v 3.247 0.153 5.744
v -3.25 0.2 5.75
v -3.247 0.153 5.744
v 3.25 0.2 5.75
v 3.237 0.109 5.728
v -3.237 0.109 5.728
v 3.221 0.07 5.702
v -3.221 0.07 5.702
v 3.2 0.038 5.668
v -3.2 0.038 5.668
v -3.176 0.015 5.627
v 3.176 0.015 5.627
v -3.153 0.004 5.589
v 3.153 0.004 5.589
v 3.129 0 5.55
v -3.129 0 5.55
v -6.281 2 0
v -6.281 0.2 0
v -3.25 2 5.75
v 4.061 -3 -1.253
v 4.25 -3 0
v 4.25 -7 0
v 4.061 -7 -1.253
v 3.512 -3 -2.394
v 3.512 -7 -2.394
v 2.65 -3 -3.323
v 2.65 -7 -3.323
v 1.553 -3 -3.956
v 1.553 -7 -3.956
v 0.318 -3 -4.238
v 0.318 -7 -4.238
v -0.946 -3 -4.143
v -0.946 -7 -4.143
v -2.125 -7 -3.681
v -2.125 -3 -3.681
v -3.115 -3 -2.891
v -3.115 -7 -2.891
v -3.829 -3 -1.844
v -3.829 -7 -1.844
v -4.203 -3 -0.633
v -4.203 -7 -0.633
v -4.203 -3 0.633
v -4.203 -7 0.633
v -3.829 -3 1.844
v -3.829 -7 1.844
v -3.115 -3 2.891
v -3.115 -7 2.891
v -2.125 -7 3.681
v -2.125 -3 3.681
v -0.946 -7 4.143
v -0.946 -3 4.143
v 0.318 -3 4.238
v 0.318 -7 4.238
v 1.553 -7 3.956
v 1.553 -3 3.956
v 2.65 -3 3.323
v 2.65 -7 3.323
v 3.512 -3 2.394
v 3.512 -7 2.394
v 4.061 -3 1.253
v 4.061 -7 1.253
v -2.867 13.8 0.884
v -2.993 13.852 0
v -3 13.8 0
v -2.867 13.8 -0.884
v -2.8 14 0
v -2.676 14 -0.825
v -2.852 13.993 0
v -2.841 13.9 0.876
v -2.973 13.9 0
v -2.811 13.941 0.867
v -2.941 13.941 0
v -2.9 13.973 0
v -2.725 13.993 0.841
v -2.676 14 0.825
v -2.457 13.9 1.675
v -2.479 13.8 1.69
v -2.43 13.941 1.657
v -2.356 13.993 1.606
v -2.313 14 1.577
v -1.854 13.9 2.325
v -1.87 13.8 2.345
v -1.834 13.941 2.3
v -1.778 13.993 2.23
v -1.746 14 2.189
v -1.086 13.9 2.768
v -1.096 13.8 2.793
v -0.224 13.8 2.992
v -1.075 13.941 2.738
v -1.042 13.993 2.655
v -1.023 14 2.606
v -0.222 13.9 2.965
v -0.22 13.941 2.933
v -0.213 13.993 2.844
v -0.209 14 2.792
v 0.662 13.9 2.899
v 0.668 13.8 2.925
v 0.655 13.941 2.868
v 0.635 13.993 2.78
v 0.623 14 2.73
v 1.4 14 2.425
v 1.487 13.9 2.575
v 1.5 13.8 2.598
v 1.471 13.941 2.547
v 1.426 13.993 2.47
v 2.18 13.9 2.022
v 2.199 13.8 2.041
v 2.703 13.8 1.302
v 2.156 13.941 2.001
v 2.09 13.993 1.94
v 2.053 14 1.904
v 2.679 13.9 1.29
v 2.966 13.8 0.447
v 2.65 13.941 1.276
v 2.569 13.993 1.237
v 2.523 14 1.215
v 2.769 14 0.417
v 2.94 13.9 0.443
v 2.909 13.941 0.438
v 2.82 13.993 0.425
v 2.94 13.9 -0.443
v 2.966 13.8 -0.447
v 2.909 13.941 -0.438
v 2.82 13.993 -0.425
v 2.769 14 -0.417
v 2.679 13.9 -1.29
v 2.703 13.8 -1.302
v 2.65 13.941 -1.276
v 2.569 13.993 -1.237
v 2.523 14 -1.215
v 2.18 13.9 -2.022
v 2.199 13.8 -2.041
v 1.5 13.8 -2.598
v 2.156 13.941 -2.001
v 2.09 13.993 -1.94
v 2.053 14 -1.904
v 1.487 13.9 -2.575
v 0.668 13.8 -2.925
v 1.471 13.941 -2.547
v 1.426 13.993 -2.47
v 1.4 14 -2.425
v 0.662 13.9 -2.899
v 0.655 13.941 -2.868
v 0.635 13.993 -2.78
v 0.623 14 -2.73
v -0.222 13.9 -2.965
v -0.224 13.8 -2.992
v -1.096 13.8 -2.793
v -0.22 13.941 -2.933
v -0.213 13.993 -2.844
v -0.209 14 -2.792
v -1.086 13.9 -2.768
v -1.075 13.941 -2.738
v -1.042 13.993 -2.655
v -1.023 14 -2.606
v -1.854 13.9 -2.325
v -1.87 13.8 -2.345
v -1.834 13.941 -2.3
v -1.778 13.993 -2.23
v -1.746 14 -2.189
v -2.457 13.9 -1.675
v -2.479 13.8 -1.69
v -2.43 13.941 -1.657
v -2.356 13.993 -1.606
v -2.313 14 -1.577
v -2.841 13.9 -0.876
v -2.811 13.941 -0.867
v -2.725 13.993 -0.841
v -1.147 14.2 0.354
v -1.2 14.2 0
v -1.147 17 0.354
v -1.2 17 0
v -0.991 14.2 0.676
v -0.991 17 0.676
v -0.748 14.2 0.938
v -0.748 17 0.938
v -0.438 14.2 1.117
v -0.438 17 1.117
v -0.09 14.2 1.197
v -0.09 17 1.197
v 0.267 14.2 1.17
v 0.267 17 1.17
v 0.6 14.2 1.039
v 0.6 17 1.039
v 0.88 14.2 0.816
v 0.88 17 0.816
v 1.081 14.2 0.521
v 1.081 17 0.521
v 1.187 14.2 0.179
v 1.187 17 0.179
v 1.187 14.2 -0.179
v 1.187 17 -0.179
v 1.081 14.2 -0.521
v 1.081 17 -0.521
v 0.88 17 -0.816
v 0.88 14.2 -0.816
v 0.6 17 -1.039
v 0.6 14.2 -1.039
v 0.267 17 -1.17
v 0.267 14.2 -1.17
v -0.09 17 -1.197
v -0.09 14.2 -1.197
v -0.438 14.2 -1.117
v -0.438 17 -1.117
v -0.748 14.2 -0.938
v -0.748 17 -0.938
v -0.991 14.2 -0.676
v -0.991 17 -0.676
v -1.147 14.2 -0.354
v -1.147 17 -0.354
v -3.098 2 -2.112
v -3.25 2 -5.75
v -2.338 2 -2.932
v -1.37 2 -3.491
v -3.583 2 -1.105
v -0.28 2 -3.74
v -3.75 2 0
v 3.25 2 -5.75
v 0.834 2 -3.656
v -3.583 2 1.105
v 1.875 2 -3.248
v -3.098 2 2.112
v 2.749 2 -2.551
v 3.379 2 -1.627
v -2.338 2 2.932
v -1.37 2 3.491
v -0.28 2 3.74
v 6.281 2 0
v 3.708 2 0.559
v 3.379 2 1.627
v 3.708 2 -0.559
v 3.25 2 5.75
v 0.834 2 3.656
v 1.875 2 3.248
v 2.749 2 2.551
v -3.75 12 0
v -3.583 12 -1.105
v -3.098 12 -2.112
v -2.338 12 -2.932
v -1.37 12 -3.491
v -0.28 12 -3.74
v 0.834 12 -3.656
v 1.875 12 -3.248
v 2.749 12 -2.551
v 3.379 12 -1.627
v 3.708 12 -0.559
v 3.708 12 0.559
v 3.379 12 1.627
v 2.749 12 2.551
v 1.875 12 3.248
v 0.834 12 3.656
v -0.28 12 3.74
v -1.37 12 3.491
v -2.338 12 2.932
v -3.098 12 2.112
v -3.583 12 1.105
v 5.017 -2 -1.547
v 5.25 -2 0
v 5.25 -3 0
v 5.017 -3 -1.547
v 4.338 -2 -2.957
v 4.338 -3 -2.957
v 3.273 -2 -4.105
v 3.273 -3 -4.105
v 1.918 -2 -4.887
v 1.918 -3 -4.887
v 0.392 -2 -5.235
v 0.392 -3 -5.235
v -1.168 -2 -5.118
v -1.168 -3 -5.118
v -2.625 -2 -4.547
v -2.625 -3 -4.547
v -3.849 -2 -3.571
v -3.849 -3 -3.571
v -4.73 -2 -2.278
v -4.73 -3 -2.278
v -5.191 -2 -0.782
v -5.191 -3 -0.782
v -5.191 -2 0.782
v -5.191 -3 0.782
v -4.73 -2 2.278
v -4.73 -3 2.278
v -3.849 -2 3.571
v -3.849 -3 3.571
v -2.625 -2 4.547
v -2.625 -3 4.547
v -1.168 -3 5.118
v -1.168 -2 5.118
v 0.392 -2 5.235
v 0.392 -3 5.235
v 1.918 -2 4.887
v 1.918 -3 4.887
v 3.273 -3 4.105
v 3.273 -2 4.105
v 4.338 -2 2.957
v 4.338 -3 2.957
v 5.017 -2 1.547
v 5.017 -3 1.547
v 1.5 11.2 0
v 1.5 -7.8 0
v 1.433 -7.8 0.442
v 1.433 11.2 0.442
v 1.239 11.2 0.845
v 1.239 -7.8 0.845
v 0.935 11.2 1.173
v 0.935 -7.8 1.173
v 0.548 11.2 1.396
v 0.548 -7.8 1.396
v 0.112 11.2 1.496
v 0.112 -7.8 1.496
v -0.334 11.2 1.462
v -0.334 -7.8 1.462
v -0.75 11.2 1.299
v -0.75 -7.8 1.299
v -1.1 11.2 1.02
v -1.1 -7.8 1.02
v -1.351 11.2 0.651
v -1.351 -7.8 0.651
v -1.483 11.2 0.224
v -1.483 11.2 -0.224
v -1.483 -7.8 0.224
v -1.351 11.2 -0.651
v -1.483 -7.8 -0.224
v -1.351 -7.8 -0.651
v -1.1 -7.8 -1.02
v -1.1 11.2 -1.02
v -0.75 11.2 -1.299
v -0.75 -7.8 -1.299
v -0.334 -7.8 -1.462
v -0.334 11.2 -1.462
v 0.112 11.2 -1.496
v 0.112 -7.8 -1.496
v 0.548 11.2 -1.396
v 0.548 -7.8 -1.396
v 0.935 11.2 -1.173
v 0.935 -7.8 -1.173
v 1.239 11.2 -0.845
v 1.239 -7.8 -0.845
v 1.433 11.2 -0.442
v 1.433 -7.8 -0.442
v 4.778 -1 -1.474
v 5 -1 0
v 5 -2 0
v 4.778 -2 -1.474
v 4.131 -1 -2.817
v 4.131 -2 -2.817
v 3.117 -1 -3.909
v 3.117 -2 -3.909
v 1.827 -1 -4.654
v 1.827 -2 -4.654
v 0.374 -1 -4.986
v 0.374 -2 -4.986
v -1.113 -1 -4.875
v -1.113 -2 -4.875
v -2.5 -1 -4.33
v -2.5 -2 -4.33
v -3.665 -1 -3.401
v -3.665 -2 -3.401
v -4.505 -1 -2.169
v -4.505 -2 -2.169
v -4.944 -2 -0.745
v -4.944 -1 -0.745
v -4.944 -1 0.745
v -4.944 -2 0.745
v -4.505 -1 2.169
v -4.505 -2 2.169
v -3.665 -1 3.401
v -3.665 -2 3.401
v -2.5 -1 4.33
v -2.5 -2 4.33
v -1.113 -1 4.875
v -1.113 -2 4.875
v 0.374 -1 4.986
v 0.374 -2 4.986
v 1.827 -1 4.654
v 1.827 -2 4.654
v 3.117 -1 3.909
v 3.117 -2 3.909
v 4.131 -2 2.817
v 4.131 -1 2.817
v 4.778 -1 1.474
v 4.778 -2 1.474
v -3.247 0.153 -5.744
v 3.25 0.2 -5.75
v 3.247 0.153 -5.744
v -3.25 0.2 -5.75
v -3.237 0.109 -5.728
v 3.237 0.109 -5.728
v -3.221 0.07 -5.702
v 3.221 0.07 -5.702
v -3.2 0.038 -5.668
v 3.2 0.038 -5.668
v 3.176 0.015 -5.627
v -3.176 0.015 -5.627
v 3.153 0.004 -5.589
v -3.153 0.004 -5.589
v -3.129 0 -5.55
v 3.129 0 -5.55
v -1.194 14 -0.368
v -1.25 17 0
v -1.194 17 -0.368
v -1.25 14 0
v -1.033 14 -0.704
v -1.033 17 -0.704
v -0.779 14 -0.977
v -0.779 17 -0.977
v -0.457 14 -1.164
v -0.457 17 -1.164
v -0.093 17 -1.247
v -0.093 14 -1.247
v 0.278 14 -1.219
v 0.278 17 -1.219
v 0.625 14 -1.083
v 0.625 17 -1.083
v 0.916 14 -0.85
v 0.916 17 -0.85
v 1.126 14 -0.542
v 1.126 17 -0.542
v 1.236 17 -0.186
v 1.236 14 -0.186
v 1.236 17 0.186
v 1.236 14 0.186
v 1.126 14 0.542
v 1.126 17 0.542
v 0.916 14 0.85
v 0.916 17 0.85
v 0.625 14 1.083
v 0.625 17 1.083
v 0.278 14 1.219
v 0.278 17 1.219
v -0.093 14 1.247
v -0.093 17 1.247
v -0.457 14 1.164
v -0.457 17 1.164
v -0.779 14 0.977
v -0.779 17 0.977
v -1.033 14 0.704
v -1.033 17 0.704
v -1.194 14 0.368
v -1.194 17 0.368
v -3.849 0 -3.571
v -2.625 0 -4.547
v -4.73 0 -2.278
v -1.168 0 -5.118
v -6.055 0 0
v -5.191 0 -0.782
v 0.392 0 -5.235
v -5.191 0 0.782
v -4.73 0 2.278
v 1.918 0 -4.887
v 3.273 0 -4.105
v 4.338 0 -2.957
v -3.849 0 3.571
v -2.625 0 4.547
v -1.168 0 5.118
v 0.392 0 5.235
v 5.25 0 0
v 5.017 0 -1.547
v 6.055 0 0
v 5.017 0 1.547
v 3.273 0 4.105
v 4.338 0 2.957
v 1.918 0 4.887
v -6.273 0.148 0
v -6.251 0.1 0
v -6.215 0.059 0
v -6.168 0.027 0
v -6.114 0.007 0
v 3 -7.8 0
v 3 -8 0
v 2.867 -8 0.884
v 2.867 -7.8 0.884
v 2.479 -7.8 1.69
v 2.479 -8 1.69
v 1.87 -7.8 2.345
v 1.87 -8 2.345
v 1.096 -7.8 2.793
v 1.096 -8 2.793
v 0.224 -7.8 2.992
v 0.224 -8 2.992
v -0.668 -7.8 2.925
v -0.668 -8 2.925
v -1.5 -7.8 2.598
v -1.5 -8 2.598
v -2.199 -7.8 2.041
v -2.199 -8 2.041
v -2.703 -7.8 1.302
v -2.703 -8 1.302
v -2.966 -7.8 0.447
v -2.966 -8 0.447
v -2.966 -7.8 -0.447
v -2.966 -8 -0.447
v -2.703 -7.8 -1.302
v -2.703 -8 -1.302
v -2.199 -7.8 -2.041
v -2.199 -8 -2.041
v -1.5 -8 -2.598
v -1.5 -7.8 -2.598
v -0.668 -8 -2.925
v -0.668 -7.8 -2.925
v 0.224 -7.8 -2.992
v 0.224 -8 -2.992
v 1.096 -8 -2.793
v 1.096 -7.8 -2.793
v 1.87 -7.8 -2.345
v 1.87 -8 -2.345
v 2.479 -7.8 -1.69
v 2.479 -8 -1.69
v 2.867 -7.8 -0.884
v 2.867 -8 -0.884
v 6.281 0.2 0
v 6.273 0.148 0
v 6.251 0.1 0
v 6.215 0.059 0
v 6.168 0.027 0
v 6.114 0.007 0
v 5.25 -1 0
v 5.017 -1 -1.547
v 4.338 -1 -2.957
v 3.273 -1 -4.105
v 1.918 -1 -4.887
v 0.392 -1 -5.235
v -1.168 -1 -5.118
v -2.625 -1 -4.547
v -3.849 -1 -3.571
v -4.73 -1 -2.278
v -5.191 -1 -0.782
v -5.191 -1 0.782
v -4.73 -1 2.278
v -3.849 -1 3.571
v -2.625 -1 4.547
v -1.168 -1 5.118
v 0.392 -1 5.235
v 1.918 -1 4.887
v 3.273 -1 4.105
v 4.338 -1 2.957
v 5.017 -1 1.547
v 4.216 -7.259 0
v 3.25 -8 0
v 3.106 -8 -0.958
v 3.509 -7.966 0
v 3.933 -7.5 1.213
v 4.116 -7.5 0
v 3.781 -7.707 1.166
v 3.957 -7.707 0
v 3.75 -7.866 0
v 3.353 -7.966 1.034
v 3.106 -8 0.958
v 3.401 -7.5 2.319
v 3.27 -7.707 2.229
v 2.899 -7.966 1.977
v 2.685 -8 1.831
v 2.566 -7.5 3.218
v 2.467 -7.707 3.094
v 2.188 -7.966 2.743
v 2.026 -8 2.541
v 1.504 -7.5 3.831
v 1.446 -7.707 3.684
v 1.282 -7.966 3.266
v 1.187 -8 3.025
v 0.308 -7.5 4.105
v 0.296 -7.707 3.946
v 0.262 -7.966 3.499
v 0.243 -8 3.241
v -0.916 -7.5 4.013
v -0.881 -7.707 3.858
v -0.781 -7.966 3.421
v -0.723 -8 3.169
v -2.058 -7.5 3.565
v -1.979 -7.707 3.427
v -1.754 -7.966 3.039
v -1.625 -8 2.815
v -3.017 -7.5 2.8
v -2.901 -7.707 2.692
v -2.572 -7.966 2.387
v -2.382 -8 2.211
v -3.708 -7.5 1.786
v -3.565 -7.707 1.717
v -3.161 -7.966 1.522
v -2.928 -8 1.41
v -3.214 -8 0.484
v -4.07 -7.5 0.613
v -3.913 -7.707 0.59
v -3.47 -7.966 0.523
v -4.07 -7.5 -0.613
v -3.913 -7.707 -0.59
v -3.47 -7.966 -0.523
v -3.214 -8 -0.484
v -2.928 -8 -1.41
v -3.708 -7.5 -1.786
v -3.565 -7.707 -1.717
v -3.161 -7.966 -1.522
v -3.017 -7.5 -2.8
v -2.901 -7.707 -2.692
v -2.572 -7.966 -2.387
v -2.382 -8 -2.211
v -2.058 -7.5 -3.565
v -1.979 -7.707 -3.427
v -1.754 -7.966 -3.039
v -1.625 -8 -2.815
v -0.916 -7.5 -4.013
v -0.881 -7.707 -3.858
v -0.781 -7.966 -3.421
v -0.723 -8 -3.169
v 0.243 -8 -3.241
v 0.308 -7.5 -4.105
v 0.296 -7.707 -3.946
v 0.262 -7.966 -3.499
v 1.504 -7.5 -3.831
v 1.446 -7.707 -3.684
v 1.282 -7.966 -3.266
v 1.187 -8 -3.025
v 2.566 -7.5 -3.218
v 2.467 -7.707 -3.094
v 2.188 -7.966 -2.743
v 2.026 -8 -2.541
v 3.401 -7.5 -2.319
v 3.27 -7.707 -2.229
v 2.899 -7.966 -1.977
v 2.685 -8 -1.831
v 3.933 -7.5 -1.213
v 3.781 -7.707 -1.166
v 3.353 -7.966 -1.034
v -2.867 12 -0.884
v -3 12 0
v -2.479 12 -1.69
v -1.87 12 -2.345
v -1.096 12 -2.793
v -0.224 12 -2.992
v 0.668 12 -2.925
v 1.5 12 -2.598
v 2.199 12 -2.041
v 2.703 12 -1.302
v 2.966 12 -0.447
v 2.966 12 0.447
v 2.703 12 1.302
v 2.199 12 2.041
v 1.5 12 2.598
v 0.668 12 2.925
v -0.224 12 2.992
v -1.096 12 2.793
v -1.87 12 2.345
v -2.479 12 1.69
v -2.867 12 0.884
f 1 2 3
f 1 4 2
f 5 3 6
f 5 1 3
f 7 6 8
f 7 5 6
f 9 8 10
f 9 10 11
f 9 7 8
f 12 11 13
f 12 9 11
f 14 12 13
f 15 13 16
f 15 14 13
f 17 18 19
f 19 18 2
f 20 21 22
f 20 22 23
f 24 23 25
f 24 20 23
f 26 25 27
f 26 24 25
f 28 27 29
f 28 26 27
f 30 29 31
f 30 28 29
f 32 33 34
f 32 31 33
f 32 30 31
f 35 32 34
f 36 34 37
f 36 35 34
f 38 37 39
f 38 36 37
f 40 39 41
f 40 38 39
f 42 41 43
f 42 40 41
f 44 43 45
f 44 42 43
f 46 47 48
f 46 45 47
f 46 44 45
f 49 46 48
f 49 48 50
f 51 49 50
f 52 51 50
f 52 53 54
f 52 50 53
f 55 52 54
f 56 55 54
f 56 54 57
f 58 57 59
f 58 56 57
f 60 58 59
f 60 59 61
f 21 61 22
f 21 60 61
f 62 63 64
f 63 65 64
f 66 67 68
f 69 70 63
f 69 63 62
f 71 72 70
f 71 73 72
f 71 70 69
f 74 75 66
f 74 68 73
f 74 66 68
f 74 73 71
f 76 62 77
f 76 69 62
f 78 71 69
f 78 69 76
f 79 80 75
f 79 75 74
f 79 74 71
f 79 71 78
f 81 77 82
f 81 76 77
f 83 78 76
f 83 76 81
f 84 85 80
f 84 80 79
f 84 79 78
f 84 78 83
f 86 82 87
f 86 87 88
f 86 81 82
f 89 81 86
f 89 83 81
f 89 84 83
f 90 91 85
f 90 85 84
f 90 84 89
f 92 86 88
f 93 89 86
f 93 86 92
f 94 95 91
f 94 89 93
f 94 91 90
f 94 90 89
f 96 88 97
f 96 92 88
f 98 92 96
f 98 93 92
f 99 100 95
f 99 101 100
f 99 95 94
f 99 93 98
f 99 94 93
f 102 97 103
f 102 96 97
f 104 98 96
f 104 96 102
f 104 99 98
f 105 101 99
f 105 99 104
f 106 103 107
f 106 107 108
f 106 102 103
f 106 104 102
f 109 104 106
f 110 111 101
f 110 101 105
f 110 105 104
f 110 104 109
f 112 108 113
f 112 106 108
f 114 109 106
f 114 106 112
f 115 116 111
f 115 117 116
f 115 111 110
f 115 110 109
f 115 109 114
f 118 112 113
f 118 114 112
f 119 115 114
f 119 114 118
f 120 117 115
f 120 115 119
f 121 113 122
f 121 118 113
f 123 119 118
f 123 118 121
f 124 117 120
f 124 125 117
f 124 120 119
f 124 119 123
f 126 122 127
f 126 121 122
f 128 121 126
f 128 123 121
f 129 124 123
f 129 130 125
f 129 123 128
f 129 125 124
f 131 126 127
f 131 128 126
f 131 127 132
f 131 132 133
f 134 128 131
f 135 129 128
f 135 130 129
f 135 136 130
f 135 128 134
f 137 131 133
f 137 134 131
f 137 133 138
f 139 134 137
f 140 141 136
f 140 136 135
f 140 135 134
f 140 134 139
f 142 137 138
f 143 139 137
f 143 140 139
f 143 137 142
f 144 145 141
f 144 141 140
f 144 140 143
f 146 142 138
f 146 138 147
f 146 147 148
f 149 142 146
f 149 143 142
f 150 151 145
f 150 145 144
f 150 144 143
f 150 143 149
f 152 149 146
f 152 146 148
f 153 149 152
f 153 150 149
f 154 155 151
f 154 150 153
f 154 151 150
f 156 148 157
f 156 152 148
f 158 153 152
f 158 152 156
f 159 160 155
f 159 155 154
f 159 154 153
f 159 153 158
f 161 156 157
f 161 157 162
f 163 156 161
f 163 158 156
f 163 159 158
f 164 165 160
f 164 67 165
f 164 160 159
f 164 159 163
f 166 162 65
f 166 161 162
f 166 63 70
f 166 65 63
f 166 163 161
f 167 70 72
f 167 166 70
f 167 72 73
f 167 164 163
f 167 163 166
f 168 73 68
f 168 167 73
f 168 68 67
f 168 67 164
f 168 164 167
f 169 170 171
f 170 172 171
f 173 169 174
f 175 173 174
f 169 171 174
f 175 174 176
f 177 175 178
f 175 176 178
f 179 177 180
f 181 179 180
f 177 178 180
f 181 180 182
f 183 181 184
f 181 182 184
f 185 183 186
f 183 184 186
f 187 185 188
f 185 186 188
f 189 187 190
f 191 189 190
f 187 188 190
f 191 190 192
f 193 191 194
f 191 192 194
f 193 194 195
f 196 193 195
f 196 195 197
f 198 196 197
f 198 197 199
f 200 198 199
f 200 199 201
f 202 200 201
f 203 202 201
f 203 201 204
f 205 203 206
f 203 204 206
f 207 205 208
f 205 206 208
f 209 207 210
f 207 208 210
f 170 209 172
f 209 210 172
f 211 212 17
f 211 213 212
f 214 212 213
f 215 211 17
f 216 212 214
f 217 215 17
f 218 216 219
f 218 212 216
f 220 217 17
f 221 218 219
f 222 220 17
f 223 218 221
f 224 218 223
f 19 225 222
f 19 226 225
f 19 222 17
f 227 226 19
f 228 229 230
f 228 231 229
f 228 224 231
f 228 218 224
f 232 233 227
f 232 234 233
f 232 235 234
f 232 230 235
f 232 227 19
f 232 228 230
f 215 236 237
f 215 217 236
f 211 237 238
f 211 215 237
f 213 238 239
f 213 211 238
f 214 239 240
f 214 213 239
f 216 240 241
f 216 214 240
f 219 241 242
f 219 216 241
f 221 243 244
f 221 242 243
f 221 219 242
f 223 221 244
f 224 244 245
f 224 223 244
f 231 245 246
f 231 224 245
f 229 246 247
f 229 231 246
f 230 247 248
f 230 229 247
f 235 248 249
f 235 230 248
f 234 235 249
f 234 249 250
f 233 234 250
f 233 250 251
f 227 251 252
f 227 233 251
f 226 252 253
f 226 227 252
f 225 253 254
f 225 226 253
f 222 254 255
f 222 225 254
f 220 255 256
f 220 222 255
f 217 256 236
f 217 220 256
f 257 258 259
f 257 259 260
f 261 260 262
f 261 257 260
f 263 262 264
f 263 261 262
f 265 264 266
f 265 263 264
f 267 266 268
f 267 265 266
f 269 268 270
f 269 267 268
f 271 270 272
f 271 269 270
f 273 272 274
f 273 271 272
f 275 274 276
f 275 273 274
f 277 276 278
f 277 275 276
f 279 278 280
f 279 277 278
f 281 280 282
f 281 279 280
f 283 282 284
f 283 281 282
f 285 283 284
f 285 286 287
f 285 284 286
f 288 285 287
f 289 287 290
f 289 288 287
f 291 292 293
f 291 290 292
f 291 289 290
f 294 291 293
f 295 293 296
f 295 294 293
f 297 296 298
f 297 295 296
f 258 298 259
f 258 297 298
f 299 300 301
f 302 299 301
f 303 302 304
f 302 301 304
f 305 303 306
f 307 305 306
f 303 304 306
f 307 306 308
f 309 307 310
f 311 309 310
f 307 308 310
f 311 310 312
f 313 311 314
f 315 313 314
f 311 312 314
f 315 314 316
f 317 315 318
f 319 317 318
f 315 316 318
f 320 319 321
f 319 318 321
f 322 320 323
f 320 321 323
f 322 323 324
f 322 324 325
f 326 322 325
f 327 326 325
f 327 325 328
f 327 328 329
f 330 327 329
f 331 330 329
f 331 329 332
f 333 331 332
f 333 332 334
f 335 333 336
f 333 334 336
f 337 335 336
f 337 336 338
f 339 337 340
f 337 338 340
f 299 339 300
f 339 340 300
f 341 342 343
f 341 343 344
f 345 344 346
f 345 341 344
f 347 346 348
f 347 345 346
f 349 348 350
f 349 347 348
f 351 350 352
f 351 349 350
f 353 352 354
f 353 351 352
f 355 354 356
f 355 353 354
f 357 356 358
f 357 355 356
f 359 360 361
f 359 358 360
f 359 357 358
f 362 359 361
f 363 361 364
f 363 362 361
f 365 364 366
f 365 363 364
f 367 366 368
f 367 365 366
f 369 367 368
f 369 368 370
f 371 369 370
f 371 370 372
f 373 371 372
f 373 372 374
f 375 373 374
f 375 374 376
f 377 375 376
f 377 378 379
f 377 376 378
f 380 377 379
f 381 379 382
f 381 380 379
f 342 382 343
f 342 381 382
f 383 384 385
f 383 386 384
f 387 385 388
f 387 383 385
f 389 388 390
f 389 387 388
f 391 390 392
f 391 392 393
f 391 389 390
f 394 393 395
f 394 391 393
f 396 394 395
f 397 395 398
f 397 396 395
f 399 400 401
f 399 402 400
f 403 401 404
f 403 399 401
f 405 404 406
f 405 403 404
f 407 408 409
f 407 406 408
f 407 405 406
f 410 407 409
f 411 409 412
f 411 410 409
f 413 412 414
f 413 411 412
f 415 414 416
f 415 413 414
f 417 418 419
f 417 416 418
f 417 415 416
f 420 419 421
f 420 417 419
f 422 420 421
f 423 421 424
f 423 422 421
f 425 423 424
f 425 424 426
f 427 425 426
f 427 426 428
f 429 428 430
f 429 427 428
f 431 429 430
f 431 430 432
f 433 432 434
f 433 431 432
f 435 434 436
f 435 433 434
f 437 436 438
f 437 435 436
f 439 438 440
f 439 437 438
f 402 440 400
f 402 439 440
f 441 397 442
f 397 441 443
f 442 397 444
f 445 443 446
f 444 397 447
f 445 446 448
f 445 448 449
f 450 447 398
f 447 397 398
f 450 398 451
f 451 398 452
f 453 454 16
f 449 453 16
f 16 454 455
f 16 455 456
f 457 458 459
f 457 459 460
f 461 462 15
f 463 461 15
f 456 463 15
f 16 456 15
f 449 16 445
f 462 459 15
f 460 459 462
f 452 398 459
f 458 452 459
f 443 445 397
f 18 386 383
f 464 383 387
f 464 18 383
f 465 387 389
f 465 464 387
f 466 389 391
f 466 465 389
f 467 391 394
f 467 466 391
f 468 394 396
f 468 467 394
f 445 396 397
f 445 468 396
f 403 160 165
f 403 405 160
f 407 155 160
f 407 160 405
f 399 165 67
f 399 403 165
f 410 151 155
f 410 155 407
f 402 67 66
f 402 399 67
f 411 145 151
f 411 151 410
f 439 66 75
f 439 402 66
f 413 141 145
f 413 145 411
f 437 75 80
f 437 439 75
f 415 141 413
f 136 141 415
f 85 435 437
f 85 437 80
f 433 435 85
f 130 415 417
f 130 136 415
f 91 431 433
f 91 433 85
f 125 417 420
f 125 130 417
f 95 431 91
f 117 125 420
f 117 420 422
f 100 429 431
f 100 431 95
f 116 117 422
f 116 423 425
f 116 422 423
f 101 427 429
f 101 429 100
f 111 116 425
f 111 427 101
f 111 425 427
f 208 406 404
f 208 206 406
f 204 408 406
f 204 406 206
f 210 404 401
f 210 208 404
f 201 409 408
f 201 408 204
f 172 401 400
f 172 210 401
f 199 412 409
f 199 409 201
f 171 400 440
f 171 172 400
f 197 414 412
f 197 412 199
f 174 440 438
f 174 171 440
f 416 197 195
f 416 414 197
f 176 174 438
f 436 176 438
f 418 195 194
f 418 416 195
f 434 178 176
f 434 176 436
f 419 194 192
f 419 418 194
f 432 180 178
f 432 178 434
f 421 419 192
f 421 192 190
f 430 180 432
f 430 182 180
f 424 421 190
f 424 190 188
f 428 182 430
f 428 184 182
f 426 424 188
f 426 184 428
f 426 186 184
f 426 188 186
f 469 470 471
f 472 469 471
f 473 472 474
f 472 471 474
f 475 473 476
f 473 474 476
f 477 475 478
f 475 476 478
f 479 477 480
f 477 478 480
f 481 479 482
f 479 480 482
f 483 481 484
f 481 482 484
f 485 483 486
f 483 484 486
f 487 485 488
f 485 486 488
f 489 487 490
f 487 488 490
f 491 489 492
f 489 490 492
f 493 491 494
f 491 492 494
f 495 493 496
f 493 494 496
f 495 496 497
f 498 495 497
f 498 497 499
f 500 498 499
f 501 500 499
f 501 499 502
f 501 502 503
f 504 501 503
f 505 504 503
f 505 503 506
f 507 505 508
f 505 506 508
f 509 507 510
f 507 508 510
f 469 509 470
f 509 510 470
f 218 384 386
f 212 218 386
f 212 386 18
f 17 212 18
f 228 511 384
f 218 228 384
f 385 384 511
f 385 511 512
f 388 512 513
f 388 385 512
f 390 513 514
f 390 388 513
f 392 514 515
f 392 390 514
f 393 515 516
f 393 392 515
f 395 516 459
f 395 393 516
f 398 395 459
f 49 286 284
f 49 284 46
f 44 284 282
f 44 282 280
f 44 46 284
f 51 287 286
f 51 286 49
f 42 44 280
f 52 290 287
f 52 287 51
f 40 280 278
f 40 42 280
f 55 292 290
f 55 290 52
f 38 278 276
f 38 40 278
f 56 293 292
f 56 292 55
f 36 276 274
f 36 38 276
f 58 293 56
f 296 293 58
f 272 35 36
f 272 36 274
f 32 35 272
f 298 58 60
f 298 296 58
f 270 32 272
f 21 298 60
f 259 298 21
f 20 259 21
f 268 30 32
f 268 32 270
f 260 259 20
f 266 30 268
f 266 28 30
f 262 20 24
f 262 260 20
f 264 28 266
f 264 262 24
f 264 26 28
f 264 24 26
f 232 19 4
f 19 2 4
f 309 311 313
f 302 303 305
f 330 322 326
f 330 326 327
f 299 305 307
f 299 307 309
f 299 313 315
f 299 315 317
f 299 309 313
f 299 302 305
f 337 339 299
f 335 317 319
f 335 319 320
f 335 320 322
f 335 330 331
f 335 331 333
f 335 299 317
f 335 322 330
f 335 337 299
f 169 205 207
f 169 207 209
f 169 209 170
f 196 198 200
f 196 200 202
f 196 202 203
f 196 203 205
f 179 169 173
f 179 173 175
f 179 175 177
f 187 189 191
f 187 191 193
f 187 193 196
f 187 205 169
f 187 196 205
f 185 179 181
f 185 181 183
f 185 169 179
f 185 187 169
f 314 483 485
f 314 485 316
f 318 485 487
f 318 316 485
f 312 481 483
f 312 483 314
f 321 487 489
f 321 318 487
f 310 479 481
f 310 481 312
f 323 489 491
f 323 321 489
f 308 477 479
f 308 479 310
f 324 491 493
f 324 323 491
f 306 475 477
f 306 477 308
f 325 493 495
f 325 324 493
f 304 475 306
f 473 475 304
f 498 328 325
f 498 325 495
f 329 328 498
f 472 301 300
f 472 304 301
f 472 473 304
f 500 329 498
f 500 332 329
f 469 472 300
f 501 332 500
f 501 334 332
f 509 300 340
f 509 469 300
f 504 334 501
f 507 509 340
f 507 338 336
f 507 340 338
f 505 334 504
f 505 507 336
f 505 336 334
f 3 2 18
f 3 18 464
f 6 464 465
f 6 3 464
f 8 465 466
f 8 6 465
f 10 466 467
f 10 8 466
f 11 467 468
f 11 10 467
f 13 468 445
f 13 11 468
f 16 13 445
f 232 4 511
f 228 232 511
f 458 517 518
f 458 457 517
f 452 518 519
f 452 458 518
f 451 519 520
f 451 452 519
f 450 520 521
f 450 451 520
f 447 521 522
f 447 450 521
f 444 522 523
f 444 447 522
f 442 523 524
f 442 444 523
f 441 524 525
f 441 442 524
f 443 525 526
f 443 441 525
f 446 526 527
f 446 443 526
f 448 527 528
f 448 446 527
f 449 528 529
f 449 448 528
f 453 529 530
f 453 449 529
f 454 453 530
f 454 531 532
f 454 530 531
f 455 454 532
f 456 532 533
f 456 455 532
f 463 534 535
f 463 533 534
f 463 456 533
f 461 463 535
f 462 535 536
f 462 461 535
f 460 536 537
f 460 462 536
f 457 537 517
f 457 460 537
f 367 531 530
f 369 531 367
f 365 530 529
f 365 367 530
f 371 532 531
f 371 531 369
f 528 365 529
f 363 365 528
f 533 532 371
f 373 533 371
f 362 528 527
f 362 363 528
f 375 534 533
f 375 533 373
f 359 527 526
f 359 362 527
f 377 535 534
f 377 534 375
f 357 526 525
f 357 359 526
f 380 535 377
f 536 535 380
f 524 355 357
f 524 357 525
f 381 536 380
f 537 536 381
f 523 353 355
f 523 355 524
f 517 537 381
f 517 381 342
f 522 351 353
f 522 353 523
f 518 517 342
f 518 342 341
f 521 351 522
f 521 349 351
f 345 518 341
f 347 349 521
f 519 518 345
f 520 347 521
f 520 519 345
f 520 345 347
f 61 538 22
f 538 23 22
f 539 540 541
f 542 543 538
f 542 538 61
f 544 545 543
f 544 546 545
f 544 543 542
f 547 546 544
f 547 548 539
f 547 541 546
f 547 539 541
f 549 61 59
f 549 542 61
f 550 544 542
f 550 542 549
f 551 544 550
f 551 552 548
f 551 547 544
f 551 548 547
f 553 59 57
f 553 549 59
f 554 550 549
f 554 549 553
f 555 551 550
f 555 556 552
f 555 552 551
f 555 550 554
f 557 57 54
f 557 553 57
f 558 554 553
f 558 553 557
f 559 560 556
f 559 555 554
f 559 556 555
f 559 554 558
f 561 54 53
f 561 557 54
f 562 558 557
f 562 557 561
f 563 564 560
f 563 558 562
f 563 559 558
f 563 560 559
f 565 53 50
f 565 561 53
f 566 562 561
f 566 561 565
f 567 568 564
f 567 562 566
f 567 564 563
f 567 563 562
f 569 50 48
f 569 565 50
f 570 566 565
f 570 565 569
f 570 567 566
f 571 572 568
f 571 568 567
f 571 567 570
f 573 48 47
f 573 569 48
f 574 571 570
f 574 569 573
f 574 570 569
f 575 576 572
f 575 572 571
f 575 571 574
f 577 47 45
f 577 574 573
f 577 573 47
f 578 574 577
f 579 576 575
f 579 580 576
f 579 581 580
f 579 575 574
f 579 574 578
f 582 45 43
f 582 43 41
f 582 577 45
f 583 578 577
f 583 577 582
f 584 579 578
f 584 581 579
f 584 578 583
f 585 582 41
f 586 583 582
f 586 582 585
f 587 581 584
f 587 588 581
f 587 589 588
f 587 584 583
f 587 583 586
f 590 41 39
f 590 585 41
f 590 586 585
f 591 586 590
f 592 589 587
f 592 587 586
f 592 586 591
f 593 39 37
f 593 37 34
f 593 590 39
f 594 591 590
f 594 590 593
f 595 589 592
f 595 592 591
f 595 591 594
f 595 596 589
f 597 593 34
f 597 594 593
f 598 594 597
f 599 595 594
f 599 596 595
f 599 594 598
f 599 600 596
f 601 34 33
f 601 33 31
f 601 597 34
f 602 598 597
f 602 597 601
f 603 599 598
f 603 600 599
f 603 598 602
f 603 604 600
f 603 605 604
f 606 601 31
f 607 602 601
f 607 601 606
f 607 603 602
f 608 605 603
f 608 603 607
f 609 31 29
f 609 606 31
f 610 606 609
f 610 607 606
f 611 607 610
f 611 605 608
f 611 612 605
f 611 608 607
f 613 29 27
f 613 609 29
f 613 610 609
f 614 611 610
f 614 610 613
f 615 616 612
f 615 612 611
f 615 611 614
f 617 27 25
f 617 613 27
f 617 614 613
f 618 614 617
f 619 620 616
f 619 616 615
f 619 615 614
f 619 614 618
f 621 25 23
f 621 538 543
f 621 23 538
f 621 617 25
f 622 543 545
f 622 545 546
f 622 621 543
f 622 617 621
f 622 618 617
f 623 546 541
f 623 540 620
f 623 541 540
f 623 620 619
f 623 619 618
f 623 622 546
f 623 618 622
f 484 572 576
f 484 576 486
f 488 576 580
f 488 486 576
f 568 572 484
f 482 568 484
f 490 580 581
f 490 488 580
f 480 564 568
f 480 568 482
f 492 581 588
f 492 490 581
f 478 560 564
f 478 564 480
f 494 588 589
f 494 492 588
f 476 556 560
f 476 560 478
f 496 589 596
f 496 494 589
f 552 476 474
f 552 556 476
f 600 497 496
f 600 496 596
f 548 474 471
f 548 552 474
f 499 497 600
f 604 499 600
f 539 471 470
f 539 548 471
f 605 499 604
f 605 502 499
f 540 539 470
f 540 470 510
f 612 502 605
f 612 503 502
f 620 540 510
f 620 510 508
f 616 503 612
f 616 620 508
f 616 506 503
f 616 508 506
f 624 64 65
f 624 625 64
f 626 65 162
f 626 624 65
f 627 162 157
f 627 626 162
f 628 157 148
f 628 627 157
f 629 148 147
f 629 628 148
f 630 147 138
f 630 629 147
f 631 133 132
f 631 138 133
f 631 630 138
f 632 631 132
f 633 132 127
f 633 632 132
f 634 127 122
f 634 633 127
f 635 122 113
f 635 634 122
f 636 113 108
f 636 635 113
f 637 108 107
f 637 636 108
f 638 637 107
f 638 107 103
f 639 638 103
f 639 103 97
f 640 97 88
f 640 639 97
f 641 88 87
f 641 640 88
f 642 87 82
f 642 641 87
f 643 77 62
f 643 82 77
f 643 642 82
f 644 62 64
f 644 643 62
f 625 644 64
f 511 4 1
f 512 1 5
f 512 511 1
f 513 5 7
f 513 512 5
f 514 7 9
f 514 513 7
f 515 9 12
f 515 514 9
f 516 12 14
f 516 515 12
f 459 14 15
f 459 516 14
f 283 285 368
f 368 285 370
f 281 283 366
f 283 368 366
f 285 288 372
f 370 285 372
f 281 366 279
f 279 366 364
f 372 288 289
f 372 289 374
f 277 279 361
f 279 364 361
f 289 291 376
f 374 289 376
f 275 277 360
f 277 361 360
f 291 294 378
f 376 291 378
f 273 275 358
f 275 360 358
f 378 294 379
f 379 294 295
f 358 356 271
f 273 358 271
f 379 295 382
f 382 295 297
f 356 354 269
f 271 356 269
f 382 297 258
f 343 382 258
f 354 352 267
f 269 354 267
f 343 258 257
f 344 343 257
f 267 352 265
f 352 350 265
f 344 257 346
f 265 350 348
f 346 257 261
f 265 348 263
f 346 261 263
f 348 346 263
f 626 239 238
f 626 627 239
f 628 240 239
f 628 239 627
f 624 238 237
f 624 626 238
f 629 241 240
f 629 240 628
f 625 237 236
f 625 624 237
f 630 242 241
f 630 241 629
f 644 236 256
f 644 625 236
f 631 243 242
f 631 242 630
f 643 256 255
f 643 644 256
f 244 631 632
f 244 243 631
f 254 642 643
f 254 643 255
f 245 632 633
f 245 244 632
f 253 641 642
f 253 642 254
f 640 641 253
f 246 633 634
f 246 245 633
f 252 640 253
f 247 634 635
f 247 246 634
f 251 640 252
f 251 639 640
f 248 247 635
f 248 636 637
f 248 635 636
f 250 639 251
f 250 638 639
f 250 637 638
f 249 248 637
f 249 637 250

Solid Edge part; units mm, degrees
sketch "Sketch1" plane through (0, 0, 0) normal (0, -1, 0) x (1, 0, 0)
  line L0 (-3.25, 5.75) -> (3.25, 5.75)
  line L1 (3.25, 5.75) -> (6.2811, 0)
  line L2 (6.2811, 0) -> (3.25, -5.75)
  line L3 (3.25, -5.75) -> (-3.25, -5.75)
  line L4 (-3.25, -5.75) -> (-6.2811, 0)
  line L5 (-6.2811, 0) -> (-3.25, 5.75)
  dimension "D1" = 6.5
  dimension "D2" = 6.5
  dimension "D3" = 6.5
  dimension "D4" = 5.75
  dimension "D5" = 5.75
  dimension "D6" = 6.5
  dimension "D7" = 3.25
  dimension "D8" = 3.25
  dimension "D9" = 6.5
  dimension "D10" = 6.5
  dimension "D11" = 5.75
  dimension "D12" = 5.75
extrude "Protrusion1" add sketch "Sketch1" against normal blind 2
fillet "Verrundung_1" radius 0.2 6 edges at (-4.7655, 0, 2.875) (0, 0, 5.75) (4.7655, 0, 2.875) (4.7655, 0, -2.875) (0, 0, -5.75) (-4.7655, 0, -2.875)
sketch "Sketch2" plane through (0, 0, 0) normal (0, -1, 0) x (1, 0, 0)
  circle A0 centre (0, 0) radius 5.25
extrude "Ausprägung_2" add sketch "Sketch2" along normal blind 1
sketch "Sketch3" plane through (0, -1, 0) normal (0, -1, 0) x (1, 0, 0)
  circle A0 centre (0, 0) radius 5
extrude "Ausprägung_3" add sketch "Sketch3" along normal blind 1
sketch "Sketch4" plane through (0, -2, 0) normal (0, -1, 0) x (1, 0, 0)
  circle A0 centre (0, 0) radius 5.25
extrude "Ausprägung_4" add sketch "Sketch4" along normal blind 1
sketch "Sketch5" plane through (0, -3, 0) normal (0, -1, 0) x (1, 0, 0)
  circle A0 centre (0, 0) radius 4.25
extrude "Ausprägung_5" add sketch "Sketch5" along normal blind 5
sketch "Sketch6" plane through (0, -8, 0) normal (0, -1, 0) x (1, 0, 0)
  circle A0 centre (0, 0) radius 3
extrude "Ausschnitt_2" cut sketch "Sketch6" against normal blind 0.2
sketch "Sketch7" plane through (0, 2, 0) normal (0, 1, 0) x (-1, 0, 0)
  circle A0 centre (0, 0) radius 3.75
extrude "Ausprägung_6" add sketch "Sketch7" along normal blind 10
sketch "Sketch8" plane through (0, 12, 0) normal (0, 1, 0) x (-1, 0, 0)
  circle A0 centre (0, 0) radius 3
extrude "Ausprägung_7" add sketch "Sketch8" along normal blind 2
sketch "Sketch9" plane through (0, 14, 0) normal (0, 1, 0) x (-1, 0, 0)
  circle A0 centre (0, 0) radius 1.25
extrude "Ausprägung_8" add sketch "Sketch9" along normal blind 3
sketch "Sketch10" plane through (0, 17, 0) normal (0, 1, 0) x (-1, 0, 0)
  circle A0 centre (0, 0) radius 1.2
extrude "Ausschnitt_3" cut sketch "Sketch10" against normal blind 2.8
sketch "Sketch11" plane through (0, -7.8, 0) normal (0, -1, 0) x (1, 0, 0)
  circle A0 centre (0, 0) radius 1.5
extrude "Ausschnitt_4" cut sketch "Sketch11" against normal blind 19
fillet "Verrundung_2" radius 1 1 edges at (-4.25, -8, 0)
fillet "Verrundung_3" radius 0.2 1 edges at (3, 14, 0)
